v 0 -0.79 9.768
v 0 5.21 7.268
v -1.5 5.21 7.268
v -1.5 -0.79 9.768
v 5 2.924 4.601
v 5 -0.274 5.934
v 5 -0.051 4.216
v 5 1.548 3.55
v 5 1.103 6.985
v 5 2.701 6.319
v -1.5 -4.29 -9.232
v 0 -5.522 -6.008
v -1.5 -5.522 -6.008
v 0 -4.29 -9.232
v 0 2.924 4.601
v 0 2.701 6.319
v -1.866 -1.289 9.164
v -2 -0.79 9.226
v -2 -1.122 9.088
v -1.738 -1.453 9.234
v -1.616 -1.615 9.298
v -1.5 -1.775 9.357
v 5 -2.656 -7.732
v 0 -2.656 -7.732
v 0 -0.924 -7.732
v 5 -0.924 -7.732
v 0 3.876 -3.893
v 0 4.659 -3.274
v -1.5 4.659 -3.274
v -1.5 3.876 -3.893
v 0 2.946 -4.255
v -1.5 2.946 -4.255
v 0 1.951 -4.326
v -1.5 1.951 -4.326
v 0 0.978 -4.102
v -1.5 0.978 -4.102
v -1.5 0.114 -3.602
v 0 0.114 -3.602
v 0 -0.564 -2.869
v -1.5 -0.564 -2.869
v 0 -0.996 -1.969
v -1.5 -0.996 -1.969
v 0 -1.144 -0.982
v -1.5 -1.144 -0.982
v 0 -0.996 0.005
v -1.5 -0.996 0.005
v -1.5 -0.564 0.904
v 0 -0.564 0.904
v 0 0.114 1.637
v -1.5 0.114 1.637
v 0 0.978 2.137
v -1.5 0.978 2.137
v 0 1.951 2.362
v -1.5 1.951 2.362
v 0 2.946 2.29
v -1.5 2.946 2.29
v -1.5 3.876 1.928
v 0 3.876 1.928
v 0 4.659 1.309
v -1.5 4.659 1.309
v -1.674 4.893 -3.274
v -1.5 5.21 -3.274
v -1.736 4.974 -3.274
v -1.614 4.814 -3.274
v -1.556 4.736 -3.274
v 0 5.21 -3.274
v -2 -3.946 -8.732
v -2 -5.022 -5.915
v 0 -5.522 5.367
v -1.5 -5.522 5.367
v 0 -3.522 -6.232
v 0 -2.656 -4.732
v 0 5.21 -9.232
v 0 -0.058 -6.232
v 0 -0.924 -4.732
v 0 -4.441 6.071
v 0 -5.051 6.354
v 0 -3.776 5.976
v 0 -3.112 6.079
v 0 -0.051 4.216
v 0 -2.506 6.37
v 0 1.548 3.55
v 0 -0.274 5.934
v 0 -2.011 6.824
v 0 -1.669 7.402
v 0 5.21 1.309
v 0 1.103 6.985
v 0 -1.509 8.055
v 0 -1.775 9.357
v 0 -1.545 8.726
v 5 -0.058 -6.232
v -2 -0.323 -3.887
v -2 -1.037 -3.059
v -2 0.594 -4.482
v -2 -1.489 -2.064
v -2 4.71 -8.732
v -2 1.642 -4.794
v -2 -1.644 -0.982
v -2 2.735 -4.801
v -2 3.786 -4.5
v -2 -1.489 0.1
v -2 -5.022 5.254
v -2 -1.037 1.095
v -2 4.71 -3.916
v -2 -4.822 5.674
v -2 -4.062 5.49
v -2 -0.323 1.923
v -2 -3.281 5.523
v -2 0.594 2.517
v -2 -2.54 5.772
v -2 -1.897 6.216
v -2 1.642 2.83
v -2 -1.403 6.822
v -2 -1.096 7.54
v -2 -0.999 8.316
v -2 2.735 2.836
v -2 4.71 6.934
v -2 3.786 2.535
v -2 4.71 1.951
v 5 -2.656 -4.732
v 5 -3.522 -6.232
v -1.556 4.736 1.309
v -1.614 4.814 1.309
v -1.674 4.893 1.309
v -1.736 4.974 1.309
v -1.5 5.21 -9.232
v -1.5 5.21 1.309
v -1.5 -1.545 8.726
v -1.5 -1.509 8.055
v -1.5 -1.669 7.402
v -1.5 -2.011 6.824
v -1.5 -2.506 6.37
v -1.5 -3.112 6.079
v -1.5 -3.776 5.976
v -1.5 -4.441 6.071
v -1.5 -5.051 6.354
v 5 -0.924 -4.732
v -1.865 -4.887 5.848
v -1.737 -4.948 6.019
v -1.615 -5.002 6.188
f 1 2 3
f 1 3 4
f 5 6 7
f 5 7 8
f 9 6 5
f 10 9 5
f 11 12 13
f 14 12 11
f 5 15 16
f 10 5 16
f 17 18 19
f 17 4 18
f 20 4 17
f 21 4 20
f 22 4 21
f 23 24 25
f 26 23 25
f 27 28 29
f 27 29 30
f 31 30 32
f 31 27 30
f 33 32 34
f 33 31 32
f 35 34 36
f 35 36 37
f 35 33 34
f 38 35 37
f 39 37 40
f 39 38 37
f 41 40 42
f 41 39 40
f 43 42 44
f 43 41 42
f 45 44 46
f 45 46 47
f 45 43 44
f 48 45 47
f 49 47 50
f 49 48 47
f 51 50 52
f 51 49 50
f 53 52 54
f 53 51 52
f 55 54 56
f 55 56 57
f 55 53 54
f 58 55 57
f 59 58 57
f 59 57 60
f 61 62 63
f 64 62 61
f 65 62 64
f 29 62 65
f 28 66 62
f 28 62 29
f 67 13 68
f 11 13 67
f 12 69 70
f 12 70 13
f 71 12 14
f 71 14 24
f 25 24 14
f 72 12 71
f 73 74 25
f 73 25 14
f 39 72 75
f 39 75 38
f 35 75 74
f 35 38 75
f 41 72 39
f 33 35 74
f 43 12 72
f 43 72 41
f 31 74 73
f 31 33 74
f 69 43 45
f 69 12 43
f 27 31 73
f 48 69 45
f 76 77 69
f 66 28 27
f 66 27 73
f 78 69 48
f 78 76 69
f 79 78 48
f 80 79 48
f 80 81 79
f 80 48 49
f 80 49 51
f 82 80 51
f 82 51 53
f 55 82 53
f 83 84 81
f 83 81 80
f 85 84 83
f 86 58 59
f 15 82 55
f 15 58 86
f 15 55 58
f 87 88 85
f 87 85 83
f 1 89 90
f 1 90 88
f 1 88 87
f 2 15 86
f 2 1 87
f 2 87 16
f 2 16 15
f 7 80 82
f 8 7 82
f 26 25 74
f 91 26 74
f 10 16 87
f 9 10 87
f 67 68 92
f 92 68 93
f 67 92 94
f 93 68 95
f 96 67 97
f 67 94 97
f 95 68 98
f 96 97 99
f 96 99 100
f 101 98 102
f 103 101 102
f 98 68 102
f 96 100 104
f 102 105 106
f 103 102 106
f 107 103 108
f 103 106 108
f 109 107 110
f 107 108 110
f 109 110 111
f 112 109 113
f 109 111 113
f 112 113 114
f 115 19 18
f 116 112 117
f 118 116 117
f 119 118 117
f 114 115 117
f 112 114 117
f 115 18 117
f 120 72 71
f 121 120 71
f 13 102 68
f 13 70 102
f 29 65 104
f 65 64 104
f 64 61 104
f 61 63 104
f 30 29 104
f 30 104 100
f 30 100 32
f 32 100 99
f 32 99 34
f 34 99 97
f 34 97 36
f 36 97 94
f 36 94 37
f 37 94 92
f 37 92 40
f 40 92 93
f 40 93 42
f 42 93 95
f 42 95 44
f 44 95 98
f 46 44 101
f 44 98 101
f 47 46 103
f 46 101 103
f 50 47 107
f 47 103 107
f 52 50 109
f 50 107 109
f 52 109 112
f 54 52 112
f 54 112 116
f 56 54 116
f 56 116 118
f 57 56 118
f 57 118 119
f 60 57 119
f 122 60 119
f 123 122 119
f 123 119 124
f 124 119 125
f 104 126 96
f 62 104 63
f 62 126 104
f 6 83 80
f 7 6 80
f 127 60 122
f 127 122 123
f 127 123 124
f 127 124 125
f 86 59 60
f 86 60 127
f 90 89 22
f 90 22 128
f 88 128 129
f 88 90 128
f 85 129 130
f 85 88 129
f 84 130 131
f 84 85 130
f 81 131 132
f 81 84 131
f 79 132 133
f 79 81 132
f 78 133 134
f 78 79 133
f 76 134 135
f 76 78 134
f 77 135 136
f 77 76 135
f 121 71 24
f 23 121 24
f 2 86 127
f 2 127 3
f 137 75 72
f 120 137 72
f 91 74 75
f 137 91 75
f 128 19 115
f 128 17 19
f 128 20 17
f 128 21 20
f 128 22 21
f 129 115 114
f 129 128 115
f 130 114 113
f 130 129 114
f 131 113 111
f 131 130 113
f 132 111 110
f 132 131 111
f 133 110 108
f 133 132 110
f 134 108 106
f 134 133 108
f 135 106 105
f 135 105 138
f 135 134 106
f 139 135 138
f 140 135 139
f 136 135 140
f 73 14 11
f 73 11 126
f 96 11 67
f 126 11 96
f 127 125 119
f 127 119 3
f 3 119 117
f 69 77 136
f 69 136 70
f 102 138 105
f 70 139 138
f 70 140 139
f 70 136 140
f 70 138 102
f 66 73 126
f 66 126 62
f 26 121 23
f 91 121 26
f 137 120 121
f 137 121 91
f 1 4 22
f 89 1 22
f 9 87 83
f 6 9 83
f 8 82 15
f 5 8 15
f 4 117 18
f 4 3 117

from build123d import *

# Parameters (mm, degrees)
F1_DEPTH    = 2
F2_DEPTH    = 5
F3_C1_SIZE  = 0.5
F3_C2_SIZE  = 0.5
F3_C3_SIZE  = 0.5
F3_C4_SIZE  = 0.5
F3_C5_SIZE  = 0.5
F3_C6_SIZE  = 0.5
F3_C7_SIZE  = 0.5
F3_C8_SIZE  = 0.5
F3_C9_SIZE  = 0.5
F3_C10_SIZE = 0.5


with BuildPart() as f1:
    # F0 (on Right) → F1 (new body)
    with BuildSketch(Plane.YZ):
        with BuildLine():
            Line((4.6591372722, 1.30894838), (5.2096475294, 1.30894838))
            Line((5.2096475294, 1.30894838), (5.2096475294, 7.2676605325))
            Line((5.2096475294, 7.2676605325), (-0.7903524706, 9.7676605325))
            Line((-0.7903524706, 9.7676605325), (-1.7747698447, 9.3573516256))
            ThreePointArc((-1.7747698447, 9.3573516256), (-2.2419413153, 6.578748784), (-5.0505708614, 6.3540645439))
            Line((-5.0505708614, 6.3540645439), (-5.5224032781, 5.3671410452))
            Line((-5.5224032781, 5.3671410452), (-5.5224032781, -6.0076899798))
            Line((-5.5224032781, -6.0076899798), (-4.2903524706, -9.2323394675))
            Line((-4.2903524706, -9.2323394675), (5.2096475294, -9.2323394675))
            Line((5.2096475294, -9.2323394675), (5.2096475294, -3.273627315))
            Line((5.2096475294, -3.273627315), (4.6591372722, -3.273627315))
            ThreePointArc((4.6591372722, -3.273627315), (-1.1444544368, -0.9823394675), (4.6591372722, 1.30894838))
        make_face()
        Polygon((-0.058301663, -6.2323394675), (-0.9243270668, -7.7323394675), (-2.6563778744, -7.7323394675), (-3.5224032781, -6.2323394675), (-2.6563778744, -4.7323394675), (-0.9243270668, -4.7323394675), align=None, mode=Mode.SUBTRACT)
        Polygon((-0.2736675582, 5.93383392), (1.1026635838, 6.9853626109), (2.7014797138, 6.3191892234), (2.9239647019, 4.601487145), (1.54763356, 3.5499584541), (-0.0511825701, 4.2161318417), align=None, mode=Mode.SUBTRACT)
        Polygon((-2.6563778744, -7.7323394675), (-0.9243270668, -7.7323394675), (-0.058301663, -6.2323394675), (-0.9243270668, -4.7323394675), (-2.6563778744, -4.7323394675), (-3.5224032781, -6.2323394675), align=None)
        Polygon((2.7014797138, 6.3191892234), (1.1026635838, 6.9853626109), (-0.2736675582, 5.93383392), (-0.0511825701, 4.2161318417), (1.54763356, 3.5499584541), (2.9239647019, 4.601487145), align=None)
    extrude(amount=-F1_DEPTH)

    # F0 (on Right) → F2 (join)
    with BuildSketch(Plane.YZ):
        Polygon((2.7014797138, 6.3191892234), (1.1026635838, 6.9853626109), (-0.2736675582, 5.93383392), (-0.0511825701, 4.2161318417), (1.54763356, 3.5499584541), (2.9239647019, 4.601487145), align=None)
        Polygon((-2.6563778744, -7.7323394675), (-0.9243270668, -7.7323394675), (-0.058301663, -6.2323394675), (-0.9243270668, -4.7323394675), (-2.6563778744, -4.7323394675), (-3.5224032781, -6.2323394675), align=None)
    extrude(amount=F2_DEPTH)

    # F3: chamfer of 0.5 on 12 edges, made by hand

    # F3_c1
    f3_c1_edges = [f1.edges().sort_by_distance(p)[0] for p in [
        (-2, -1.1444544368, -0.9823394675),
    ]]
    chamfer(f3_c1_edges, length=F3_C1_SIZE)

    # F3_c2
    f3_c2_edges = [f1.edges().sort_by_distance(p)[0] for p in [
        (-2, 5.2096475294, 4.352423109),
    ]]
    chamfer(f3_c2_edges, length=F3_C2_SIZE)

    # F3_c3
    f3_c3_edges = [f1.edges().sort_by_distance(p)[0] for p in [
        (-2, 1.9596475294, 8.6218271992),
    ]]
    chamfer(f3_c3_edges, length=F3_C3_SIZE)

    # F3_c4
    f3_c4_edges = [f1.edges().sort_by_distance(p)[0] for p in [
        (-2, -1.6075076826, 9.4270671311),
    ]]
    chamfer(f3_c4_edges, length=F3_C4_SIZE)

    # F3_c5
    f3_c5_edges = [f1.edges().sort_by_distance(p)[0] for p in [
        (-2, -2.43546855, 6.4198809023),
    ]]
    chamfer(f3_c5_edges, length=F3_C5_SIZE)

    # F3_c6
    f3_c6_edges = [f1.edges().sort_by_distance(p)[0] for p in [
        (-2, -5.39514647, 5.633321854),
    ]]
    chamfer(f3_c6_edges, length=F3_C6_SIZE)

    # F3_c7
    f3_c7_edges = [f1.edges().sort_by_distance(p)[0] for p in [
        (-2, -5.5224032781, -0.8998828859),
    ]]
    chamfer(f3_c7_edges, length=F3_C7_SIZE)

    # F3_c8
    f3_c8_edges = [f1.edges().sort_by_distance(p)[0] for p in [
        (-2, -4.6563778744, -8.2743403139),
    ]]
    chamfer(f3_c8_edges, length=F3_C8_SIZE)

    # F3_c9
    f3_c9_edges = [f1.edges().sort_by_distance(p)[0] for p in [
        (-2, 0.7272736227, -9.2323394675),
    ]]
    chamfer(f3_c9_edges, length=F3_C9_SIZE)

    # F3_c10
    f3_c10_edges = [f1.edges().sort_by_distance(p)[0] for p in [
        (-2, 5.2096475294, -6.067102044),
    ]]
    chamfer(f3_c10_edges, length=F3_C10_SIZE)


solid = f1.part
